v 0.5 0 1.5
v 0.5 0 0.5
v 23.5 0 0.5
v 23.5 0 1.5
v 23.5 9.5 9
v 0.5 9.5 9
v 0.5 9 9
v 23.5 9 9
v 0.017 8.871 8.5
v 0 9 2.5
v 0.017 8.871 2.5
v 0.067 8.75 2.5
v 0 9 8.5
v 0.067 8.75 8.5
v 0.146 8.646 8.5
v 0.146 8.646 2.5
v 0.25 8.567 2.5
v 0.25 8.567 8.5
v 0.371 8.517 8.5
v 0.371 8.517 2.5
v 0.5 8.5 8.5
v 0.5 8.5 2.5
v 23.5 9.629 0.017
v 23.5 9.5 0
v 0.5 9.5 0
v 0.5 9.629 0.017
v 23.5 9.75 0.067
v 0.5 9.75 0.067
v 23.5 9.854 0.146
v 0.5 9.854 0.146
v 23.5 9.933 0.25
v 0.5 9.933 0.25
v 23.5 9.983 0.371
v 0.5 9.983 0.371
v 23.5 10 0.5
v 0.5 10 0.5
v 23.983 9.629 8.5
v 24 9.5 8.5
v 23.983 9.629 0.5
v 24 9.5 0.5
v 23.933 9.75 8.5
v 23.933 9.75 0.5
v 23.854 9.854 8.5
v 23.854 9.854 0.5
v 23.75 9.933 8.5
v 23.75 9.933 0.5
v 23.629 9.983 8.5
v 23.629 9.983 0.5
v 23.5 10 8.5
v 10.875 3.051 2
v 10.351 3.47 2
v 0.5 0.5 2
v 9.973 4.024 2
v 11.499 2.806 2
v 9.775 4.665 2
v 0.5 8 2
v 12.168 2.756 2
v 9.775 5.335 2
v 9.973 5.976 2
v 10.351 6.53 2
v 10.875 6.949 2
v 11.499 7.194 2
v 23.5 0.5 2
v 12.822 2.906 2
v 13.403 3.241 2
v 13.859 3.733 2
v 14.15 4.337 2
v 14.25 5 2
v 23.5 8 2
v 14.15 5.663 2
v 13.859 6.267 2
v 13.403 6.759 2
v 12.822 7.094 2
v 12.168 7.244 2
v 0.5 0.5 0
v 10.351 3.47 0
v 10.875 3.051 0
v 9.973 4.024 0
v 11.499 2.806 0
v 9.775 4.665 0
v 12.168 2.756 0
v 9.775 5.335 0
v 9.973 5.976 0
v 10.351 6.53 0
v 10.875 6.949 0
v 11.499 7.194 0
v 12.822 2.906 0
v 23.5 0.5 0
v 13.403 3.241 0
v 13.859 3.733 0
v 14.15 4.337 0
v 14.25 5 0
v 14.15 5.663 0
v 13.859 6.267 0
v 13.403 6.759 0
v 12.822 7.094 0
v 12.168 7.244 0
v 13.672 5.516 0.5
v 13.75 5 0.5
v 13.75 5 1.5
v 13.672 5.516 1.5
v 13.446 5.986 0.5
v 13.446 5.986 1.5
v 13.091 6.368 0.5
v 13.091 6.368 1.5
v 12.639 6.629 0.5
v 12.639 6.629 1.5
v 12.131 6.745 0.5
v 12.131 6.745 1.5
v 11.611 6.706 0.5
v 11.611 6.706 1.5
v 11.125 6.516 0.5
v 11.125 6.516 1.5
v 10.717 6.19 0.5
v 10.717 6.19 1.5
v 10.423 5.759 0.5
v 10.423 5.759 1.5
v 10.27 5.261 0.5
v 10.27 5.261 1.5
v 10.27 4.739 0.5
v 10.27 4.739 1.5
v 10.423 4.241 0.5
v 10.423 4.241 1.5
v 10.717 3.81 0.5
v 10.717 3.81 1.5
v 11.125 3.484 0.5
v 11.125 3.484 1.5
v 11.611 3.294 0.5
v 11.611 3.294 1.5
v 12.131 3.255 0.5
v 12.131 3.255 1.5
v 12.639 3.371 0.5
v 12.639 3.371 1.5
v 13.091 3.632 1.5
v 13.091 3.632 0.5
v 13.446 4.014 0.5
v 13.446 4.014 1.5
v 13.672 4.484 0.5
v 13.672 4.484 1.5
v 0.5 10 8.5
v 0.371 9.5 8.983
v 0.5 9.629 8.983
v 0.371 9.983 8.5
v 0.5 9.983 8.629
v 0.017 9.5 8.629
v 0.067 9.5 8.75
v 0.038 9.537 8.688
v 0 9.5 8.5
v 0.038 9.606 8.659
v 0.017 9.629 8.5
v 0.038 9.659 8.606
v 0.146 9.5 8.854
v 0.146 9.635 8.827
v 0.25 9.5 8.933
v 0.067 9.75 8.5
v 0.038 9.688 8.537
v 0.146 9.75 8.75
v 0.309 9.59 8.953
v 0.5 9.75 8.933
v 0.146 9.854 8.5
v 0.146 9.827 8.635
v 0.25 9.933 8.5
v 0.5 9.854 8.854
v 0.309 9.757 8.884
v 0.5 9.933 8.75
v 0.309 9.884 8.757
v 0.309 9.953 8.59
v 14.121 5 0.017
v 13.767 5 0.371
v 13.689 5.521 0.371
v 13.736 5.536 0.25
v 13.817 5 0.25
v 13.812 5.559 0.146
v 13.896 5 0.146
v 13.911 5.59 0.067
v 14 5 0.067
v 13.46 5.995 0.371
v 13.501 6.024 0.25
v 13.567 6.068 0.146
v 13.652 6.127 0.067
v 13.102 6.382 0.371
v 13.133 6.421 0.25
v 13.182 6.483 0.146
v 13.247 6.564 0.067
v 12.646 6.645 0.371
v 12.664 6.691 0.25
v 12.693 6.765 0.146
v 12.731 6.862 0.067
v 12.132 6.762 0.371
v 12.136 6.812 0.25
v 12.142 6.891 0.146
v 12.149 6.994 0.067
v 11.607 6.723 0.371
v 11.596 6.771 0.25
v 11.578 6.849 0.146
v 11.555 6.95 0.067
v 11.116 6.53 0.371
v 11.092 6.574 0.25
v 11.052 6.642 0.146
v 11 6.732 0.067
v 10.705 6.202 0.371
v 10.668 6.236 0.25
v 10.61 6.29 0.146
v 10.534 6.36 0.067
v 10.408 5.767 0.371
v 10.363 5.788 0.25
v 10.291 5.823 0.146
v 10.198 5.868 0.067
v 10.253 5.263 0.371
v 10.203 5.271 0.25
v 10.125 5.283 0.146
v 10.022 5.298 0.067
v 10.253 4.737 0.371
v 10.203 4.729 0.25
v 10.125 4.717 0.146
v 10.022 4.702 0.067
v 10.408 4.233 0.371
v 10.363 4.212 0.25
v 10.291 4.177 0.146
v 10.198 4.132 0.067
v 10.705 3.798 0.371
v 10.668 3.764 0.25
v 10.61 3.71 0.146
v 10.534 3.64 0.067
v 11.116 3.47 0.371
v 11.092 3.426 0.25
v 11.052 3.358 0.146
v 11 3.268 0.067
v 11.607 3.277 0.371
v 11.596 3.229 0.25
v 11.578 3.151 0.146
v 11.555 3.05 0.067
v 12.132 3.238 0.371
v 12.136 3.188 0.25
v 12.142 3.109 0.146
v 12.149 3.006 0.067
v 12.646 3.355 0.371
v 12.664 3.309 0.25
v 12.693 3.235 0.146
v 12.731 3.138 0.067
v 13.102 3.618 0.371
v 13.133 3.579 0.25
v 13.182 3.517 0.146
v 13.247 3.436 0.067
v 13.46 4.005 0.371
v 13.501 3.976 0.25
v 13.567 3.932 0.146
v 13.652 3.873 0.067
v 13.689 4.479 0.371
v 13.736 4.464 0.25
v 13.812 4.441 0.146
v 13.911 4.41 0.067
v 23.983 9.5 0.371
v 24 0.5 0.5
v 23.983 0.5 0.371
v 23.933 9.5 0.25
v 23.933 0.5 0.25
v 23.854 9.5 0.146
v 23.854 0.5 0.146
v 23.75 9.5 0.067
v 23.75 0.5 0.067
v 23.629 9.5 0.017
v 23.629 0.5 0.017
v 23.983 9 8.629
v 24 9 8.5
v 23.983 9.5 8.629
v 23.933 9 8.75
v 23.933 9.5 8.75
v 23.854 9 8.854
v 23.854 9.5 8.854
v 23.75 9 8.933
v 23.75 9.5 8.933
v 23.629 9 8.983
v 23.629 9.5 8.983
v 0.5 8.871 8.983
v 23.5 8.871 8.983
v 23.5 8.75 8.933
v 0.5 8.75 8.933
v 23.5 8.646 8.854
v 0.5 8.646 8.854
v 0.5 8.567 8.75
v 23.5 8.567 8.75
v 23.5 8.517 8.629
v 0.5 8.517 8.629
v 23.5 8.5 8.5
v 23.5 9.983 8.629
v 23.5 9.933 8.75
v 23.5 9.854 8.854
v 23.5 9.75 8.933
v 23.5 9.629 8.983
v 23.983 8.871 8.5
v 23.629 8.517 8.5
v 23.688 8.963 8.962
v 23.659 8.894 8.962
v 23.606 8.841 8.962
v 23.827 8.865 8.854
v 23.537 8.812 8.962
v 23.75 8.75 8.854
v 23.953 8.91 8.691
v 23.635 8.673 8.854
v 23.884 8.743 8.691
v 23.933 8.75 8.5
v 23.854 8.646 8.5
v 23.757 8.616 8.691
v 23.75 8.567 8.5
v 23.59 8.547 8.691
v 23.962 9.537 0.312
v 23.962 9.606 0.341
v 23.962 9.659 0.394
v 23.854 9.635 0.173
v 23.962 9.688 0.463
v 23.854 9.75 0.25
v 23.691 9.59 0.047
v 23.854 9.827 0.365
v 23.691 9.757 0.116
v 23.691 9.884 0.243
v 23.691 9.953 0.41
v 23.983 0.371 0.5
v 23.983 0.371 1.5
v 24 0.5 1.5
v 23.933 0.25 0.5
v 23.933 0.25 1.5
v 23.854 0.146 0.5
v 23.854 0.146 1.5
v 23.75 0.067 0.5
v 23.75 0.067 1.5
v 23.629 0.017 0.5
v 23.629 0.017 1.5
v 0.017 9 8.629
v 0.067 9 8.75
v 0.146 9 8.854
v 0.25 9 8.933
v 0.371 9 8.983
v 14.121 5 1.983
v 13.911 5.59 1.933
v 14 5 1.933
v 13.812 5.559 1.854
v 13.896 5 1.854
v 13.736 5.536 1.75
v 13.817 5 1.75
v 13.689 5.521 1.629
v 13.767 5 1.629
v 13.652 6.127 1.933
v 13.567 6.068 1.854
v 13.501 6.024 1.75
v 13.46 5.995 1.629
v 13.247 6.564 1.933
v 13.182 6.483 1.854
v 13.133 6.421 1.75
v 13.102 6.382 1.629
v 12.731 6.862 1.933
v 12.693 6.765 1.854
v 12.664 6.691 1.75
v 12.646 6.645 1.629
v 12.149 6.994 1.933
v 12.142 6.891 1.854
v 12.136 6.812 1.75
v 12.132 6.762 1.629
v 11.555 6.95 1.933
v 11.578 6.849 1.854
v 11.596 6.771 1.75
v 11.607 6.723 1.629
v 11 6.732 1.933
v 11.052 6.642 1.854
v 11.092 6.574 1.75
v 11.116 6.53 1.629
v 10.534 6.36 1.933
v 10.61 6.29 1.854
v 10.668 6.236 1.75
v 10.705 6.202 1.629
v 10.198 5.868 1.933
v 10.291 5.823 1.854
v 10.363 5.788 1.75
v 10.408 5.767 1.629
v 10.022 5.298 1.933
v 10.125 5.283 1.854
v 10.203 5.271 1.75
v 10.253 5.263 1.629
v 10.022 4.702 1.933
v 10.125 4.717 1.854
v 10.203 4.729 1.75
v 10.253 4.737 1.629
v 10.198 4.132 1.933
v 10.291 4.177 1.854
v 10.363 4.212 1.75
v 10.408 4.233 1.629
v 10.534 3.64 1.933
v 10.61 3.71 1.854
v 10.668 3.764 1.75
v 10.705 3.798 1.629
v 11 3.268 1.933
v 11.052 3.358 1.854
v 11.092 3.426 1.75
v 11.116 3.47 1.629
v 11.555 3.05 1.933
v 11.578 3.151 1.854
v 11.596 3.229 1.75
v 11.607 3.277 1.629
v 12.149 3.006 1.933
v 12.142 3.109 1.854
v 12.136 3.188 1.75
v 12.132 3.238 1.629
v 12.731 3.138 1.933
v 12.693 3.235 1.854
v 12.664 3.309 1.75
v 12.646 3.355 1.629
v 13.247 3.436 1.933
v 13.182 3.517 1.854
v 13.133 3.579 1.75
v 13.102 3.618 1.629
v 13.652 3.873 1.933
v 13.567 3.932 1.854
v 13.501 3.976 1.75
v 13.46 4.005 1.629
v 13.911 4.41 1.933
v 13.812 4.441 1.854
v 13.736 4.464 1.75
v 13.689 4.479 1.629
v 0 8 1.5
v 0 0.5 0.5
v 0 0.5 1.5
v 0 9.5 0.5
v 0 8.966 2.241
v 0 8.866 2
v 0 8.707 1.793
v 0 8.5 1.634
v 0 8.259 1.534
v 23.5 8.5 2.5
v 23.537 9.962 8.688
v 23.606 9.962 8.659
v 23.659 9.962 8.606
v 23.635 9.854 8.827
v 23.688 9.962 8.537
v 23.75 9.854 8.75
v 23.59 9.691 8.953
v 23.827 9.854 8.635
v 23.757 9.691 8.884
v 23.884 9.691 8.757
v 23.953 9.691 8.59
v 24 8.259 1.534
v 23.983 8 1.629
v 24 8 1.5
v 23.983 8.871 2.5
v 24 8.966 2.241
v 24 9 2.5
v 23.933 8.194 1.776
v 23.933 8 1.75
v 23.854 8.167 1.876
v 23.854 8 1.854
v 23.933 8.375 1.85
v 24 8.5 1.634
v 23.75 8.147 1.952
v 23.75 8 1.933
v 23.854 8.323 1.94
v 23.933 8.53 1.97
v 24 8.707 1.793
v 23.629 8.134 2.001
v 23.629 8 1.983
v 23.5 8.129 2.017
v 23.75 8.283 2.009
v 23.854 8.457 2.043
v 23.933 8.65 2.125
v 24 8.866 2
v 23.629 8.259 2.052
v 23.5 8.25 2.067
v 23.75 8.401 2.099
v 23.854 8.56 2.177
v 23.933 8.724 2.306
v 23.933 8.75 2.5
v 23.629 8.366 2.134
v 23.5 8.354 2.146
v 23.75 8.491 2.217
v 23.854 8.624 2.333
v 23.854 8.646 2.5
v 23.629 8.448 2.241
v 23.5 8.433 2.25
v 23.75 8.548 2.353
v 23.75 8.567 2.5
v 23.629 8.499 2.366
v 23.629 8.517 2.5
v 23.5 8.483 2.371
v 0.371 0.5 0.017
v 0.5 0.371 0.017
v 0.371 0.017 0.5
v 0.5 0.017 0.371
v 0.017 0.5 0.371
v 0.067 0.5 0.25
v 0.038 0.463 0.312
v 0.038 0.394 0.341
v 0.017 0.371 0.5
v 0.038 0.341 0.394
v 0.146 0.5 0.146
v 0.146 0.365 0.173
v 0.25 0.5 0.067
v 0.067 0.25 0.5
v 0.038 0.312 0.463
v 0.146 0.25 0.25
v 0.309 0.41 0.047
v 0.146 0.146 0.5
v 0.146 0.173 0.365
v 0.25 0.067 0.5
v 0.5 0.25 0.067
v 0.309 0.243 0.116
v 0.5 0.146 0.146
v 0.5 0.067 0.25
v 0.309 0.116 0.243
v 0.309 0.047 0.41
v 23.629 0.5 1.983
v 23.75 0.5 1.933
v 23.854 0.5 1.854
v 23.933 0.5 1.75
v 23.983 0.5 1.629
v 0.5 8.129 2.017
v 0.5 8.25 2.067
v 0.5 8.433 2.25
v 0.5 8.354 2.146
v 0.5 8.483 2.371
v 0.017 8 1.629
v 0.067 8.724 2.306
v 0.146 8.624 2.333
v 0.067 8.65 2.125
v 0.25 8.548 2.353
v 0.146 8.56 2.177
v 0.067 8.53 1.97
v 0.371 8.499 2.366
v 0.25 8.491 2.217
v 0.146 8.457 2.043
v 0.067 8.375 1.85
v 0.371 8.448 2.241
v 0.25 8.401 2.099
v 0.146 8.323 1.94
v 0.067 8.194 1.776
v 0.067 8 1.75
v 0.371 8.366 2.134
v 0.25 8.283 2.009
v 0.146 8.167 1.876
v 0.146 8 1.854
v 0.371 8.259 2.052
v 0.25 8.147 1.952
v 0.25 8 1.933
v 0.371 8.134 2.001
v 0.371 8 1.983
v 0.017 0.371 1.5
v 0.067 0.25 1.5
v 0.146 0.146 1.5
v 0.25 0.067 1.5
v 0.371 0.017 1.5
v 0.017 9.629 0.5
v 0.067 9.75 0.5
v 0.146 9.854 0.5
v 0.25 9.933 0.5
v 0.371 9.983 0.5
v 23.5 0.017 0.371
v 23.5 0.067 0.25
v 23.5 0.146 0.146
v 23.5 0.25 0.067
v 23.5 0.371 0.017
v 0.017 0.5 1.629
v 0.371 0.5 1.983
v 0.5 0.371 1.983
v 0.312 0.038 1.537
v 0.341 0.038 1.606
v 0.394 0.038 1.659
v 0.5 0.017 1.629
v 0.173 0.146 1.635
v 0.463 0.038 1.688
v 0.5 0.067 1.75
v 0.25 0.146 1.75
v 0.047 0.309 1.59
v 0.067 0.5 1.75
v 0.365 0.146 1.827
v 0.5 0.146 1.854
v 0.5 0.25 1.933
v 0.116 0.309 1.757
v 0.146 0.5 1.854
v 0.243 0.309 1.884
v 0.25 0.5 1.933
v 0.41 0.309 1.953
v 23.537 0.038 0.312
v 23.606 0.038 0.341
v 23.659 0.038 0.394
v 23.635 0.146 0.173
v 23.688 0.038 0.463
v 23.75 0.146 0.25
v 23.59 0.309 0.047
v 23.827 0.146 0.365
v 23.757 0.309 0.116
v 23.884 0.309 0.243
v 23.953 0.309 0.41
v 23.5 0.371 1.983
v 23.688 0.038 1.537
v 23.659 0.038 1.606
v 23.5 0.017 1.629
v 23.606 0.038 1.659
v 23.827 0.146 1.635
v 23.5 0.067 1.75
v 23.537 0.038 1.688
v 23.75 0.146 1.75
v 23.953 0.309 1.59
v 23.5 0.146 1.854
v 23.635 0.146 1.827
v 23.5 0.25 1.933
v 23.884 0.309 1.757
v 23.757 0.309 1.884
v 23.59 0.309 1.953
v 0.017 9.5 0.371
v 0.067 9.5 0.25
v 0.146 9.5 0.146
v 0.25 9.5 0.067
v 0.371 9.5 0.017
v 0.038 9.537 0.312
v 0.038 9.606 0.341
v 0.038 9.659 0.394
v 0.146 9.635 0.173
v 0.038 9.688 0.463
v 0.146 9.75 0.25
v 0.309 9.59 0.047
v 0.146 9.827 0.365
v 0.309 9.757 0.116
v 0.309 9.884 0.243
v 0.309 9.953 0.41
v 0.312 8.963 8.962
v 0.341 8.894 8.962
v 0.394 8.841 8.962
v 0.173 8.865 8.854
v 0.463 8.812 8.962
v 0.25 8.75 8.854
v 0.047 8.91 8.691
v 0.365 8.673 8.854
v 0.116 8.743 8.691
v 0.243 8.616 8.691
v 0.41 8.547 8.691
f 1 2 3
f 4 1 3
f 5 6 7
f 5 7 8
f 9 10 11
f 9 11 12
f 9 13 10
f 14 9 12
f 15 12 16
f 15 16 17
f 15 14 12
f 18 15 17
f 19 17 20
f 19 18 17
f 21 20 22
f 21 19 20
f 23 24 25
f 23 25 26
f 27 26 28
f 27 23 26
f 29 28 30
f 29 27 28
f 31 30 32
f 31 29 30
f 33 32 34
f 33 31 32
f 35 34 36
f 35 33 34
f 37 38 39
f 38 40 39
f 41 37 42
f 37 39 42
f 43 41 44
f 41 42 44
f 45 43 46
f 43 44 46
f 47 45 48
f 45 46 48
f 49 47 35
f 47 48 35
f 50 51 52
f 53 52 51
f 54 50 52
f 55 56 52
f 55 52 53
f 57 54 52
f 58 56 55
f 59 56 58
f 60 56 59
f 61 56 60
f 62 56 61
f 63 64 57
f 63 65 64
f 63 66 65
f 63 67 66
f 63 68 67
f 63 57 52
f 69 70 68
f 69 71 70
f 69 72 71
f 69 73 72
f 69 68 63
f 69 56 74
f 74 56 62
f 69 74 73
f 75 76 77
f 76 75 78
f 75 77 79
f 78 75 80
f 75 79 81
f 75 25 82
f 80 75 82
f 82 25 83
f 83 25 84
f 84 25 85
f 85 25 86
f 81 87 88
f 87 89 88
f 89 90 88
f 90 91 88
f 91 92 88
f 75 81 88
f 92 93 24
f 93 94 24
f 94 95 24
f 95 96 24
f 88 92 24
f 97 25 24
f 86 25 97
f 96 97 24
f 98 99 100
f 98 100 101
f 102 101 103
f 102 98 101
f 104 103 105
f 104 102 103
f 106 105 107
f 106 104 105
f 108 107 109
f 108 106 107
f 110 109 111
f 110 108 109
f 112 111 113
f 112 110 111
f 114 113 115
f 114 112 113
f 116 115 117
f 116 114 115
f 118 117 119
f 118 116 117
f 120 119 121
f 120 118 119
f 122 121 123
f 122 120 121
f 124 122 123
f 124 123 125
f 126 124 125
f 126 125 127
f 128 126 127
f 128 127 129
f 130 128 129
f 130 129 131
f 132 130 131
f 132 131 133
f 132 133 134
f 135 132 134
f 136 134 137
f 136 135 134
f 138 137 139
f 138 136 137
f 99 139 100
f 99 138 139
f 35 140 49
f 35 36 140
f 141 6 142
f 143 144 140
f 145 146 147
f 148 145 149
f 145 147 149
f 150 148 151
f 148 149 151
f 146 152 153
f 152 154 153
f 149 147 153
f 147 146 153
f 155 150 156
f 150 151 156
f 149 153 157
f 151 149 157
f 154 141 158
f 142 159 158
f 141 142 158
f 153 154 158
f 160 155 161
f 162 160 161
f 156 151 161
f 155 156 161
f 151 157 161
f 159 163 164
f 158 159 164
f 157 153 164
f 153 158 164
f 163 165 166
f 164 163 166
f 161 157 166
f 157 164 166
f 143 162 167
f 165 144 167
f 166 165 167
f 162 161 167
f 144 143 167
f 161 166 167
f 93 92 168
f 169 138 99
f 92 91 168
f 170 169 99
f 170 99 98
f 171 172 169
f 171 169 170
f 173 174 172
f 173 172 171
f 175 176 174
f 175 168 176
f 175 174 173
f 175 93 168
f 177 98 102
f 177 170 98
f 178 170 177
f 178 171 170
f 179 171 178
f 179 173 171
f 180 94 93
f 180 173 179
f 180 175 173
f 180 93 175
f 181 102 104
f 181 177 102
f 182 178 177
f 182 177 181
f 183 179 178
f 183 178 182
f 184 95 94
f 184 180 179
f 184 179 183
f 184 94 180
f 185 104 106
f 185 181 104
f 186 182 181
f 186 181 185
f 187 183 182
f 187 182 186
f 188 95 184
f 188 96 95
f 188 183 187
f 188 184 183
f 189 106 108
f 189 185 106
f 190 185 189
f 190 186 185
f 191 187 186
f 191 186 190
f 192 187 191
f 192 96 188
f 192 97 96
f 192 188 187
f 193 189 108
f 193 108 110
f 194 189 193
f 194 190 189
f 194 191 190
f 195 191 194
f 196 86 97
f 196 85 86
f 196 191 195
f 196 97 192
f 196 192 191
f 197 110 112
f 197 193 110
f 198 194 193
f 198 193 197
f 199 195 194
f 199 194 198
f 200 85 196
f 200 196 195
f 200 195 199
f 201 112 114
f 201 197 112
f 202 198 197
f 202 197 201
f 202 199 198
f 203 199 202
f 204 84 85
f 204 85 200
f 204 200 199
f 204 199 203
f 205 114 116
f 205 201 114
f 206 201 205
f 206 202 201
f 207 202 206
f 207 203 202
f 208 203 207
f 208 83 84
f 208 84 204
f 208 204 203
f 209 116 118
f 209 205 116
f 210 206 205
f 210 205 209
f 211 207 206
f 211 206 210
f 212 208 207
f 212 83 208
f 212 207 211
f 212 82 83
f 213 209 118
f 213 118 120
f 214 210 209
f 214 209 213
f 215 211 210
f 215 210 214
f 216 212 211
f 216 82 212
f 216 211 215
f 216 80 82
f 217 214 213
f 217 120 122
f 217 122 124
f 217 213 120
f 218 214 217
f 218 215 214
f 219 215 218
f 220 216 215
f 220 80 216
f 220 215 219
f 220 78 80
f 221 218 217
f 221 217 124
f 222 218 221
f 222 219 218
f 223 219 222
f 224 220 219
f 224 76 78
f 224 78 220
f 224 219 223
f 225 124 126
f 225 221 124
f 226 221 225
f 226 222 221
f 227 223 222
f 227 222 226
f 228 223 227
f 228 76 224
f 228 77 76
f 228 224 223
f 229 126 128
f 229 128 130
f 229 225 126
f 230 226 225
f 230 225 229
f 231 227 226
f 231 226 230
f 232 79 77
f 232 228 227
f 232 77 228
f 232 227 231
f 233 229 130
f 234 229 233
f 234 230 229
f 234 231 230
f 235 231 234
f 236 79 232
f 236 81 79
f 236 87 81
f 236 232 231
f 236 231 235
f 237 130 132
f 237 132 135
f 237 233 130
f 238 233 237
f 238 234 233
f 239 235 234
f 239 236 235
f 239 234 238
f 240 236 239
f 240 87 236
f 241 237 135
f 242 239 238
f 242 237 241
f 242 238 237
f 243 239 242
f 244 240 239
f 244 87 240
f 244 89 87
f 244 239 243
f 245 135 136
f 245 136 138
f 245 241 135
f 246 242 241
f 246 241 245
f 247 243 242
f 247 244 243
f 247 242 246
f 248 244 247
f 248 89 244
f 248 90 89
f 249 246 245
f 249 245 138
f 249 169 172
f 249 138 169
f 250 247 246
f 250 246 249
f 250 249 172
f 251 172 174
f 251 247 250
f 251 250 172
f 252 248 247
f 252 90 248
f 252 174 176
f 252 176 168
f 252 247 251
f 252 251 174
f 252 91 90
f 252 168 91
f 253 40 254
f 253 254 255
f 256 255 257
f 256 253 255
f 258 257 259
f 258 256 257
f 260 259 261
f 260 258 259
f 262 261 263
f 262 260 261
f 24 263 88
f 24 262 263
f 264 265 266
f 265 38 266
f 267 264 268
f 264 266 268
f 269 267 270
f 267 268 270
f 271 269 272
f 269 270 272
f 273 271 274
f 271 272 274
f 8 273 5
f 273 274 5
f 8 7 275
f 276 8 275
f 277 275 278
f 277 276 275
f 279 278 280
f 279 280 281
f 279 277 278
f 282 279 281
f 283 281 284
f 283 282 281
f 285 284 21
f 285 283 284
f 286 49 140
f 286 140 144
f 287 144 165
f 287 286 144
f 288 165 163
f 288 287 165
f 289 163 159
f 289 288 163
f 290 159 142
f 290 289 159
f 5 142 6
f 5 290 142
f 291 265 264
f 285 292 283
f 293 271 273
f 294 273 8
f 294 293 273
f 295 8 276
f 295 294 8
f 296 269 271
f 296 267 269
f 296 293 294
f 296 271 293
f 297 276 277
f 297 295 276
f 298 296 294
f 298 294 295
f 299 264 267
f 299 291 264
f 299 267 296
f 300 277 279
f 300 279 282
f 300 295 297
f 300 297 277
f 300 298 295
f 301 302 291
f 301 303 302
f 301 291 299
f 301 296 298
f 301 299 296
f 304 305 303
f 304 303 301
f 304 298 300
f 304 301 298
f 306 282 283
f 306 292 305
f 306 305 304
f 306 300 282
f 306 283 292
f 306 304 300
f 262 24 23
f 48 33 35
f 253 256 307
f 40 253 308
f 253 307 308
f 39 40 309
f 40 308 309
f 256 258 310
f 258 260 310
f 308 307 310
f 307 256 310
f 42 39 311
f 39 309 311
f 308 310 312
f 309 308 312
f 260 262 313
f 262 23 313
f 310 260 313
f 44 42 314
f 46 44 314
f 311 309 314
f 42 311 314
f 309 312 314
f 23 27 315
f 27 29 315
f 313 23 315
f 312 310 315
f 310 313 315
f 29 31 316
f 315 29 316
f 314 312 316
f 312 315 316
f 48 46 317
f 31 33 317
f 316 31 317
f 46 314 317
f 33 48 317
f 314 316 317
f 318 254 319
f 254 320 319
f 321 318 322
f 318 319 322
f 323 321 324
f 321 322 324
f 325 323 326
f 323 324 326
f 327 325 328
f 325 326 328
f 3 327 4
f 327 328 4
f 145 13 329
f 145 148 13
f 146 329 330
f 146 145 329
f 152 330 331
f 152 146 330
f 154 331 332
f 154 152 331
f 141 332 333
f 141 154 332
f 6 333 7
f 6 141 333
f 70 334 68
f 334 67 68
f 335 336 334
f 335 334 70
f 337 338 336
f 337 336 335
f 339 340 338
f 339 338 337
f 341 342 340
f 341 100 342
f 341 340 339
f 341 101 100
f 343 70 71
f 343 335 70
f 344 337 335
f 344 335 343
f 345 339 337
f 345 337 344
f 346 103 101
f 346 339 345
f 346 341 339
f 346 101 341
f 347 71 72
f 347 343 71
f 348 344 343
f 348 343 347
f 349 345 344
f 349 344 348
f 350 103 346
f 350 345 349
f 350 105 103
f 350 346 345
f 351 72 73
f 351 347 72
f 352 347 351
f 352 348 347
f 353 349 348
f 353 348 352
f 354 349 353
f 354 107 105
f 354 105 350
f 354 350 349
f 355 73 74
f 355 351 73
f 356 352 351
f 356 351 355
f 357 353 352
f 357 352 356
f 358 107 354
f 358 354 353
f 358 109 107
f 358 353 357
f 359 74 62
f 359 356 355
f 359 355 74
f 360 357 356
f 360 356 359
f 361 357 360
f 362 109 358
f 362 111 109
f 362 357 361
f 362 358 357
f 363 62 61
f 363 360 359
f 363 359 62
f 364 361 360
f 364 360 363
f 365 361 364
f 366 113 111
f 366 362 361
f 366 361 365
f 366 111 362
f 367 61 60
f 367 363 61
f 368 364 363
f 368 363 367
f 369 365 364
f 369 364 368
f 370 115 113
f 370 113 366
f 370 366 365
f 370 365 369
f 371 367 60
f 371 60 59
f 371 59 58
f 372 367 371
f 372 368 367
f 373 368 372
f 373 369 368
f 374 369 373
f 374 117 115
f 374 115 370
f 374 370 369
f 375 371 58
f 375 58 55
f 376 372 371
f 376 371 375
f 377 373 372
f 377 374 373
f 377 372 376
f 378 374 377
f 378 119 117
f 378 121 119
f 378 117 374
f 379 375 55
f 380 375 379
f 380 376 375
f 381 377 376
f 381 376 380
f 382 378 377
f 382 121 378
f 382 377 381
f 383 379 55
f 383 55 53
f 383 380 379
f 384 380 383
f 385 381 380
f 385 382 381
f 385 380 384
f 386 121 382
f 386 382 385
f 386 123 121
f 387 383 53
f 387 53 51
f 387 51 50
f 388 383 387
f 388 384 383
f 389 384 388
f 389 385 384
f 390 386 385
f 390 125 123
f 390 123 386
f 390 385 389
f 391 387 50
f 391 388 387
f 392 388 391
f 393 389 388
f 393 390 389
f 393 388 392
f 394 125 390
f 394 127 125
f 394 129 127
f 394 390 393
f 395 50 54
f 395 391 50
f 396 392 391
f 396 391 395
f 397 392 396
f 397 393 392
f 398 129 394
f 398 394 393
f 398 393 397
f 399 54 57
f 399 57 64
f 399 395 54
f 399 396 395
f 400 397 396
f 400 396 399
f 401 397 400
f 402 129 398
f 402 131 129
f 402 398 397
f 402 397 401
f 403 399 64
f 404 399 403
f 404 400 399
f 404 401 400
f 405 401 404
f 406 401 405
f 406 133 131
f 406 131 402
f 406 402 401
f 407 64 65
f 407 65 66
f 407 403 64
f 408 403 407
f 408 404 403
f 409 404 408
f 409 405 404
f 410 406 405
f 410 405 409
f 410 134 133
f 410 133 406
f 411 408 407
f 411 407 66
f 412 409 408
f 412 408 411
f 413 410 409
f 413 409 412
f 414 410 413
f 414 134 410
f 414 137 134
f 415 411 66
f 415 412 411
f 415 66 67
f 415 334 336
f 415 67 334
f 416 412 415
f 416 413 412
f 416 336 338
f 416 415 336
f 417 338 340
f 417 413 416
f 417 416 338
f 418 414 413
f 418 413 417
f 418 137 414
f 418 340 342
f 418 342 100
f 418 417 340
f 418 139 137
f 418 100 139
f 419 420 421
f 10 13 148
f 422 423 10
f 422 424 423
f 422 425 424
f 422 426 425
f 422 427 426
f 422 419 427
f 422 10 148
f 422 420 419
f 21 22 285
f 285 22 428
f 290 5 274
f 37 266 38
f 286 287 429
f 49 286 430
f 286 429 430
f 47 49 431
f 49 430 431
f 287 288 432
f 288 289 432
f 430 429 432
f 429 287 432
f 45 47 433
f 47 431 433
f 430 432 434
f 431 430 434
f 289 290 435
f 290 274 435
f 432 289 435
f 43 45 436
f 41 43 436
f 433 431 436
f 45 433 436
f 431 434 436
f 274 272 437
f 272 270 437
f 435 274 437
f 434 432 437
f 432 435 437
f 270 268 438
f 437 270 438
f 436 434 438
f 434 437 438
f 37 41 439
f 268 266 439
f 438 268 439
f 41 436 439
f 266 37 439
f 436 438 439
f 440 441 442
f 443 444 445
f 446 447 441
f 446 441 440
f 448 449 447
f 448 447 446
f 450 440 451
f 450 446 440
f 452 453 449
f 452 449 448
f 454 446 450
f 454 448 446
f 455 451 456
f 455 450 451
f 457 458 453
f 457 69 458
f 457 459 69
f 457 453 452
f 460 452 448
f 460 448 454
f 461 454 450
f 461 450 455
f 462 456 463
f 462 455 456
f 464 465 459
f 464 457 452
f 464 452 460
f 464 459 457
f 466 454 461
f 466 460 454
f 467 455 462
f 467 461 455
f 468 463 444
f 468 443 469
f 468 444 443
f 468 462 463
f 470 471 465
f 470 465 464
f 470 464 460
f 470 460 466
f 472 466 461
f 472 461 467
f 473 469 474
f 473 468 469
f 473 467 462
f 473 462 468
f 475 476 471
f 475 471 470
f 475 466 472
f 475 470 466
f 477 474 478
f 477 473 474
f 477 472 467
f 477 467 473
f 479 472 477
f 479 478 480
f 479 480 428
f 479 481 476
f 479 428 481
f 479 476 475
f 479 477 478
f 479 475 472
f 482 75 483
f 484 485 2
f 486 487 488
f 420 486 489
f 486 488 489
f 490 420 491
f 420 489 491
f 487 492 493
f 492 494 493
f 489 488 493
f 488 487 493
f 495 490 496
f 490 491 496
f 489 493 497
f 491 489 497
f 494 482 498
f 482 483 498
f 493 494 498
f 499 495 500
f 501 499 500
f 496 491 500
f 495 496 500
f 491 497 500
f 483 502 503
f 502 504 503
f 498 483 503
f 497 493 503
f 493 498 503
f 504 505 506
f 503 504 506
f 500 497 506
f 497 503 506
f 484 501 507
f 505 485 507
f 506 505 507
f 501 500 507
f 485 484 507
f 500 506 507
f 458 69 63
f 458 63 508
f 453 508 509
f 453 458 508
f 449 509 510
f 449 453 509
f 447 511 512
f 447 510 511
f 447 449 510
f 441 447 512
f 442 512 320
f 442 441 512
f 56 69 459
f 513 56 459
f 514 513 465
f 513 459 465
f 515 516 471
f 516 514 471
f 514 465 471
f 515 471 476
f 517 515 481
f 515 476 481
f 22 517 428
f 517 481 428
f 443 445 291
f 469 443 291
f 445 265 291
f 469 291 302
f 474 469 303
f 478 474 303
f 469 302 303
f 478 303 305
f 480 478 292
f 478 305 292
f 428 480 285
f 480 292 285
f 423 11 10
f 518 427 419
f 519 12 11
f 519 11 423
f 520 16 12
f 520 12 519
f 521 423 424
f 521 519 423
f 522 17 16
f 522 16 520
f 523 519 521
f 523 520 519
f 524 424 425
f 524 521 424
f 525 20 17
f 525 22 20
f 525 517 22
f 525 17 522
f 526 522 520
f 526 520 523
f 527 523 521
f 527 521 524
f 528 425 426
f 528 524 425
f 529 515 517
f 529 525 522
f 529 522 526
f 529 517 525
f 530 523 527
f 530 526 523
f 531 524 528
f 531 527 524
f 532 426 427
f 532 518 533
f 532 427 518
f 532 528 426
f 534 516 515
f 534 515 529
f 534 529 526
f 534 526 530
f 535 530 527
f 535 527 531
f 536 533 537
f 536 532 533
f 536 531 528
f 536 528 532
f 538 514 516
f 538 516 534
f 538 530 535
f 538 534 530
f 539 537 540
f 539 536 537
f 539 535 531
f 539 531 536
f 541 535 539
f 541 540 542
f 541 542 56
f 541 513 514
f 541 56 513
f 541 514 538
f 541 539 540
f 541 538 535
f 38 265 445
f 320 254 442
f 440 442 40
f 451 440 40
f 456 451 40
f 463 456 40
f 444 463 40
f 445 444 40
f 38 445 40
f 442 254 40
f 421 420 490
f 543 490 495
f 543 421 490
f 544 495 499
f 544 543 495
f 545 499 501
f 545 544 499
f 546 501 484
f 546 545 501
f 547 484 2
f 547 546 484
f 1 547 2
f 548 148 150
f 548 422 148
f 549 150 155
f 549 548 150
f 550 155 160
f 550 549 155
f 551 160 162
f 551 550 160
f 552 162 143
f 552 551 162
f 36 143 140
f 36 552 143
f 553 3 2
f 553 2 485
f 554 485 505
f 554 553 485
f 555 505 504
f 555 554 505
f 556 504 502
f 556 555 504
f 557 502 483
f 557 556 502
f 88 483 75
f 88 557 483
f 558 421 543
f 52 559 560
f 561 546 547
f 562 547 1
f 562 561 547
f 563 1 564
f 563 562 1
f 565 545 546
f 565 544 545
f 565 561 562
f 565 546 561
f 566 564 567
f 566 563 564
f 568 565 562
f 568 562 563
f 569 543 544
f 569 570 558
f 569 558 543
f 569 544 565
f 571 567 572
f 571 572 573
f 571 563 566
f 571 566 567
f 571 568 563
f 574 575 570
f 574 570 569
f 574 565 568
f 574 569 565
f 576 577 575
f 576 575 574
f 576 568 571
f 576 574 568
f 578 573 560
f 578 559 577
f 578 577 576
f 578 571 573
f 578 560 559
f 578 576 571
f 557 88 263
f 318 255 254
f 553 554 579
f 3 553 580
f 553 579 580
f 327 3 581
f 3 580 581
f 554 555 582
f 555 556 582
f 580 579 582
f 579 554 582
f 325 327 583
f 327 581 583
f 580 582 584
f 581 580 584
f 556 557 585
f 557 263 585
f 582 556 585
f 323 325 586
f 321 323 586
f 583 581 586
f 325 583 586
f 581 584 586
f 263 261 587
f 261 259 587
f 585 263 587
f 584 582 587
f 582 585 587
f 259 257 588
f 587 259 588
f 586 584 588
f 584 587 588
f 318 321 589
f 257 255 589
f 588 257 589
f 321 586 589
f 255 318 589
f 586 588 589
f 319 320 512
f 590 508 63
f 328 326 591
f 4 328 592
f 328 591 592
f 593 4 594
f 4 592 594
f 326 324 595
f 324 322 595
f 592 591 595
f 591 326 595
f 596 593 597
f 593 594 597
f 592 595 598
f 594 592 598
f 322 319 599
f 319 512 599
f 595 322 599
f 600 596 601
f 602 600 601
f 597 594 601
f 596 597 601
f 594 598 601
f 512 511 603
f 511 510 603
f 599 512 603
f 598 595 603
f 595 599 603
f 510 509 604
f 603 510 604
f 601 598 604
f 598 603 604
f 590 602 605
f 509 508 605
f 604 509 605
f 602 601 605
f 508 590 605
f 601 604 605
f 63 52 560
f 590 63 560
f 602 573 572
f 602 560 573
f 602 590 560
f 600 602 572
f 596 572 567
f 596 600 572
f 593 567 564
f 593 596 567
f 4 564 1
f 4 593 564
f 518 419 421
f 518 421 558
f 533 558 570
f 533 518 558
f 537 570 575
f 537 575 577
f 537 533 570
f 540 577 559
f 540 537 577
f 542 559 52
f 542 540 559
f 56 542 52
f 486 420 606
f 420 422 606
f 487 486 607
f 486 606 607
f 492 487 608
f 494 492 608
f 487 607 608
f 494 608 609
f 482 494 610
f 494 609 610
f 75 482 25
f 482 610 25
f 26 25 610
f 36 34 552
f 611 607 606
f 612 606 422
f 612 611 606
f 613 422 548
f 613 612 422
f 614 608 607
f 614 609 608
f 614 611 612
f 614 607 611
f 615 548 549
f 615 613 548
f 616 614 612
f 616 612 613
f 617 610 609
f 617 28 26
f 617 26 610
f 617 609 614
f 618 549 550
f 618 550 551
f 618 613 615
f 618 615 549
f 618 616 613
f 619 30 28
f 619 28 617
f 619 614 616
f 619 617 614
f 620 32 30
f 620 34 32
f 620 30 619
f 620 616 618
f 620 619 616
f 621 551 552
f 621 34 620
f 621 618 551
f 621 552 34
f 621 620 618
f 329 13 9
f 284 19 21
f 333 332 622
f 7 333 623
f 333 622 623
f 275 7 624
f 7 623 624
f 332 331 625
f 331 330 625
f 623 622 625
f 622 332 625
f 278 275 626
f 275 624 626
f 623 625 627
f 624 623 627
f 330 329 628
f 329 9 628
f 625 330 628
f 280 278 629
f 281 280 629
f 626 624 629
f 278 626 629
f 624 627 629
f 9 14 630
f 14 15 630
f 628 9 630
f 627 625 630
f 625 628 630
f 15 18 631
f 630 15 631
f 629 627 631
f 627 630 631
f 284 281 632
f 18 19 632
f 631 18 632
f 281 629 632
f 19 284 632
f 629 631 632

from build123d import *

# Parameters (mm, degrees)
CROQUIS1_W              = 24
CROQUIS1_H              = 10
CROQUIS1_R              = 1.75
SALIENTE_EXTRUIR1_DEPTH = 2
CROQUIS2_W              = 24
CROQUIS2_H              = 1.5
SALIENTE_EXTRUIR2_DEPTH = 7
REDONDEO1_R             = 0.5


with BuildPart() as part:
    # Croquis1 → Saliente-Extruir1 (new body)
    with BuildSketch(Plane.XY):
        with Locations((12, 5)):
            Rectangle(CROQUIS1_W, CROQUIS1_H)
        with Locations((12, 5)):
            Circle(CROQUIS1_R, mode=Mode.SUBTRACT)
    extrude(amount=SALIENTE_EXTRUIR1_DEPTH)

    # Croquis2 → Saliente-Extruir2 (add)
    with BuildSketch(Plane.XY.offset(2)):
        with Locations((12, 9.25)):
            Rectangle(CROQUIS2_W, CROQUIS2_H)
    extrude(amount=SALIENTE_EXTRUIR2_DEPTH)

    # Redondeo1
    redondeo1_edges = [part.edges().sort_by_distance(p)[0] for p in [
        (10.25, 5, 0),
        (10.25, 5, 2),
        (24, 4.25, 2),
        (0, 4.25, 2),
        (24, 8.5, 5.5),
        (12, 8.5, 2),
        (0, 8.5, 5.5),
        (24, 9.25, 9),
        (12, 10, 9),
        (0, 9.25, 9),
        (12, 8.5, 9),
        (12, 10, 0),
        (24, 5, 0),
        (12, 0, 0),
        (0, 5, 0),
        (0, 10, 4.5),
        (24, 10, 4.5),
        (24, 0, 1),
        (0, 0, 1),
        (12, 0, 2),
    ]]
    fillet(redondeo1_edges, radius=REDONDEO1_R)


solid = part.part
